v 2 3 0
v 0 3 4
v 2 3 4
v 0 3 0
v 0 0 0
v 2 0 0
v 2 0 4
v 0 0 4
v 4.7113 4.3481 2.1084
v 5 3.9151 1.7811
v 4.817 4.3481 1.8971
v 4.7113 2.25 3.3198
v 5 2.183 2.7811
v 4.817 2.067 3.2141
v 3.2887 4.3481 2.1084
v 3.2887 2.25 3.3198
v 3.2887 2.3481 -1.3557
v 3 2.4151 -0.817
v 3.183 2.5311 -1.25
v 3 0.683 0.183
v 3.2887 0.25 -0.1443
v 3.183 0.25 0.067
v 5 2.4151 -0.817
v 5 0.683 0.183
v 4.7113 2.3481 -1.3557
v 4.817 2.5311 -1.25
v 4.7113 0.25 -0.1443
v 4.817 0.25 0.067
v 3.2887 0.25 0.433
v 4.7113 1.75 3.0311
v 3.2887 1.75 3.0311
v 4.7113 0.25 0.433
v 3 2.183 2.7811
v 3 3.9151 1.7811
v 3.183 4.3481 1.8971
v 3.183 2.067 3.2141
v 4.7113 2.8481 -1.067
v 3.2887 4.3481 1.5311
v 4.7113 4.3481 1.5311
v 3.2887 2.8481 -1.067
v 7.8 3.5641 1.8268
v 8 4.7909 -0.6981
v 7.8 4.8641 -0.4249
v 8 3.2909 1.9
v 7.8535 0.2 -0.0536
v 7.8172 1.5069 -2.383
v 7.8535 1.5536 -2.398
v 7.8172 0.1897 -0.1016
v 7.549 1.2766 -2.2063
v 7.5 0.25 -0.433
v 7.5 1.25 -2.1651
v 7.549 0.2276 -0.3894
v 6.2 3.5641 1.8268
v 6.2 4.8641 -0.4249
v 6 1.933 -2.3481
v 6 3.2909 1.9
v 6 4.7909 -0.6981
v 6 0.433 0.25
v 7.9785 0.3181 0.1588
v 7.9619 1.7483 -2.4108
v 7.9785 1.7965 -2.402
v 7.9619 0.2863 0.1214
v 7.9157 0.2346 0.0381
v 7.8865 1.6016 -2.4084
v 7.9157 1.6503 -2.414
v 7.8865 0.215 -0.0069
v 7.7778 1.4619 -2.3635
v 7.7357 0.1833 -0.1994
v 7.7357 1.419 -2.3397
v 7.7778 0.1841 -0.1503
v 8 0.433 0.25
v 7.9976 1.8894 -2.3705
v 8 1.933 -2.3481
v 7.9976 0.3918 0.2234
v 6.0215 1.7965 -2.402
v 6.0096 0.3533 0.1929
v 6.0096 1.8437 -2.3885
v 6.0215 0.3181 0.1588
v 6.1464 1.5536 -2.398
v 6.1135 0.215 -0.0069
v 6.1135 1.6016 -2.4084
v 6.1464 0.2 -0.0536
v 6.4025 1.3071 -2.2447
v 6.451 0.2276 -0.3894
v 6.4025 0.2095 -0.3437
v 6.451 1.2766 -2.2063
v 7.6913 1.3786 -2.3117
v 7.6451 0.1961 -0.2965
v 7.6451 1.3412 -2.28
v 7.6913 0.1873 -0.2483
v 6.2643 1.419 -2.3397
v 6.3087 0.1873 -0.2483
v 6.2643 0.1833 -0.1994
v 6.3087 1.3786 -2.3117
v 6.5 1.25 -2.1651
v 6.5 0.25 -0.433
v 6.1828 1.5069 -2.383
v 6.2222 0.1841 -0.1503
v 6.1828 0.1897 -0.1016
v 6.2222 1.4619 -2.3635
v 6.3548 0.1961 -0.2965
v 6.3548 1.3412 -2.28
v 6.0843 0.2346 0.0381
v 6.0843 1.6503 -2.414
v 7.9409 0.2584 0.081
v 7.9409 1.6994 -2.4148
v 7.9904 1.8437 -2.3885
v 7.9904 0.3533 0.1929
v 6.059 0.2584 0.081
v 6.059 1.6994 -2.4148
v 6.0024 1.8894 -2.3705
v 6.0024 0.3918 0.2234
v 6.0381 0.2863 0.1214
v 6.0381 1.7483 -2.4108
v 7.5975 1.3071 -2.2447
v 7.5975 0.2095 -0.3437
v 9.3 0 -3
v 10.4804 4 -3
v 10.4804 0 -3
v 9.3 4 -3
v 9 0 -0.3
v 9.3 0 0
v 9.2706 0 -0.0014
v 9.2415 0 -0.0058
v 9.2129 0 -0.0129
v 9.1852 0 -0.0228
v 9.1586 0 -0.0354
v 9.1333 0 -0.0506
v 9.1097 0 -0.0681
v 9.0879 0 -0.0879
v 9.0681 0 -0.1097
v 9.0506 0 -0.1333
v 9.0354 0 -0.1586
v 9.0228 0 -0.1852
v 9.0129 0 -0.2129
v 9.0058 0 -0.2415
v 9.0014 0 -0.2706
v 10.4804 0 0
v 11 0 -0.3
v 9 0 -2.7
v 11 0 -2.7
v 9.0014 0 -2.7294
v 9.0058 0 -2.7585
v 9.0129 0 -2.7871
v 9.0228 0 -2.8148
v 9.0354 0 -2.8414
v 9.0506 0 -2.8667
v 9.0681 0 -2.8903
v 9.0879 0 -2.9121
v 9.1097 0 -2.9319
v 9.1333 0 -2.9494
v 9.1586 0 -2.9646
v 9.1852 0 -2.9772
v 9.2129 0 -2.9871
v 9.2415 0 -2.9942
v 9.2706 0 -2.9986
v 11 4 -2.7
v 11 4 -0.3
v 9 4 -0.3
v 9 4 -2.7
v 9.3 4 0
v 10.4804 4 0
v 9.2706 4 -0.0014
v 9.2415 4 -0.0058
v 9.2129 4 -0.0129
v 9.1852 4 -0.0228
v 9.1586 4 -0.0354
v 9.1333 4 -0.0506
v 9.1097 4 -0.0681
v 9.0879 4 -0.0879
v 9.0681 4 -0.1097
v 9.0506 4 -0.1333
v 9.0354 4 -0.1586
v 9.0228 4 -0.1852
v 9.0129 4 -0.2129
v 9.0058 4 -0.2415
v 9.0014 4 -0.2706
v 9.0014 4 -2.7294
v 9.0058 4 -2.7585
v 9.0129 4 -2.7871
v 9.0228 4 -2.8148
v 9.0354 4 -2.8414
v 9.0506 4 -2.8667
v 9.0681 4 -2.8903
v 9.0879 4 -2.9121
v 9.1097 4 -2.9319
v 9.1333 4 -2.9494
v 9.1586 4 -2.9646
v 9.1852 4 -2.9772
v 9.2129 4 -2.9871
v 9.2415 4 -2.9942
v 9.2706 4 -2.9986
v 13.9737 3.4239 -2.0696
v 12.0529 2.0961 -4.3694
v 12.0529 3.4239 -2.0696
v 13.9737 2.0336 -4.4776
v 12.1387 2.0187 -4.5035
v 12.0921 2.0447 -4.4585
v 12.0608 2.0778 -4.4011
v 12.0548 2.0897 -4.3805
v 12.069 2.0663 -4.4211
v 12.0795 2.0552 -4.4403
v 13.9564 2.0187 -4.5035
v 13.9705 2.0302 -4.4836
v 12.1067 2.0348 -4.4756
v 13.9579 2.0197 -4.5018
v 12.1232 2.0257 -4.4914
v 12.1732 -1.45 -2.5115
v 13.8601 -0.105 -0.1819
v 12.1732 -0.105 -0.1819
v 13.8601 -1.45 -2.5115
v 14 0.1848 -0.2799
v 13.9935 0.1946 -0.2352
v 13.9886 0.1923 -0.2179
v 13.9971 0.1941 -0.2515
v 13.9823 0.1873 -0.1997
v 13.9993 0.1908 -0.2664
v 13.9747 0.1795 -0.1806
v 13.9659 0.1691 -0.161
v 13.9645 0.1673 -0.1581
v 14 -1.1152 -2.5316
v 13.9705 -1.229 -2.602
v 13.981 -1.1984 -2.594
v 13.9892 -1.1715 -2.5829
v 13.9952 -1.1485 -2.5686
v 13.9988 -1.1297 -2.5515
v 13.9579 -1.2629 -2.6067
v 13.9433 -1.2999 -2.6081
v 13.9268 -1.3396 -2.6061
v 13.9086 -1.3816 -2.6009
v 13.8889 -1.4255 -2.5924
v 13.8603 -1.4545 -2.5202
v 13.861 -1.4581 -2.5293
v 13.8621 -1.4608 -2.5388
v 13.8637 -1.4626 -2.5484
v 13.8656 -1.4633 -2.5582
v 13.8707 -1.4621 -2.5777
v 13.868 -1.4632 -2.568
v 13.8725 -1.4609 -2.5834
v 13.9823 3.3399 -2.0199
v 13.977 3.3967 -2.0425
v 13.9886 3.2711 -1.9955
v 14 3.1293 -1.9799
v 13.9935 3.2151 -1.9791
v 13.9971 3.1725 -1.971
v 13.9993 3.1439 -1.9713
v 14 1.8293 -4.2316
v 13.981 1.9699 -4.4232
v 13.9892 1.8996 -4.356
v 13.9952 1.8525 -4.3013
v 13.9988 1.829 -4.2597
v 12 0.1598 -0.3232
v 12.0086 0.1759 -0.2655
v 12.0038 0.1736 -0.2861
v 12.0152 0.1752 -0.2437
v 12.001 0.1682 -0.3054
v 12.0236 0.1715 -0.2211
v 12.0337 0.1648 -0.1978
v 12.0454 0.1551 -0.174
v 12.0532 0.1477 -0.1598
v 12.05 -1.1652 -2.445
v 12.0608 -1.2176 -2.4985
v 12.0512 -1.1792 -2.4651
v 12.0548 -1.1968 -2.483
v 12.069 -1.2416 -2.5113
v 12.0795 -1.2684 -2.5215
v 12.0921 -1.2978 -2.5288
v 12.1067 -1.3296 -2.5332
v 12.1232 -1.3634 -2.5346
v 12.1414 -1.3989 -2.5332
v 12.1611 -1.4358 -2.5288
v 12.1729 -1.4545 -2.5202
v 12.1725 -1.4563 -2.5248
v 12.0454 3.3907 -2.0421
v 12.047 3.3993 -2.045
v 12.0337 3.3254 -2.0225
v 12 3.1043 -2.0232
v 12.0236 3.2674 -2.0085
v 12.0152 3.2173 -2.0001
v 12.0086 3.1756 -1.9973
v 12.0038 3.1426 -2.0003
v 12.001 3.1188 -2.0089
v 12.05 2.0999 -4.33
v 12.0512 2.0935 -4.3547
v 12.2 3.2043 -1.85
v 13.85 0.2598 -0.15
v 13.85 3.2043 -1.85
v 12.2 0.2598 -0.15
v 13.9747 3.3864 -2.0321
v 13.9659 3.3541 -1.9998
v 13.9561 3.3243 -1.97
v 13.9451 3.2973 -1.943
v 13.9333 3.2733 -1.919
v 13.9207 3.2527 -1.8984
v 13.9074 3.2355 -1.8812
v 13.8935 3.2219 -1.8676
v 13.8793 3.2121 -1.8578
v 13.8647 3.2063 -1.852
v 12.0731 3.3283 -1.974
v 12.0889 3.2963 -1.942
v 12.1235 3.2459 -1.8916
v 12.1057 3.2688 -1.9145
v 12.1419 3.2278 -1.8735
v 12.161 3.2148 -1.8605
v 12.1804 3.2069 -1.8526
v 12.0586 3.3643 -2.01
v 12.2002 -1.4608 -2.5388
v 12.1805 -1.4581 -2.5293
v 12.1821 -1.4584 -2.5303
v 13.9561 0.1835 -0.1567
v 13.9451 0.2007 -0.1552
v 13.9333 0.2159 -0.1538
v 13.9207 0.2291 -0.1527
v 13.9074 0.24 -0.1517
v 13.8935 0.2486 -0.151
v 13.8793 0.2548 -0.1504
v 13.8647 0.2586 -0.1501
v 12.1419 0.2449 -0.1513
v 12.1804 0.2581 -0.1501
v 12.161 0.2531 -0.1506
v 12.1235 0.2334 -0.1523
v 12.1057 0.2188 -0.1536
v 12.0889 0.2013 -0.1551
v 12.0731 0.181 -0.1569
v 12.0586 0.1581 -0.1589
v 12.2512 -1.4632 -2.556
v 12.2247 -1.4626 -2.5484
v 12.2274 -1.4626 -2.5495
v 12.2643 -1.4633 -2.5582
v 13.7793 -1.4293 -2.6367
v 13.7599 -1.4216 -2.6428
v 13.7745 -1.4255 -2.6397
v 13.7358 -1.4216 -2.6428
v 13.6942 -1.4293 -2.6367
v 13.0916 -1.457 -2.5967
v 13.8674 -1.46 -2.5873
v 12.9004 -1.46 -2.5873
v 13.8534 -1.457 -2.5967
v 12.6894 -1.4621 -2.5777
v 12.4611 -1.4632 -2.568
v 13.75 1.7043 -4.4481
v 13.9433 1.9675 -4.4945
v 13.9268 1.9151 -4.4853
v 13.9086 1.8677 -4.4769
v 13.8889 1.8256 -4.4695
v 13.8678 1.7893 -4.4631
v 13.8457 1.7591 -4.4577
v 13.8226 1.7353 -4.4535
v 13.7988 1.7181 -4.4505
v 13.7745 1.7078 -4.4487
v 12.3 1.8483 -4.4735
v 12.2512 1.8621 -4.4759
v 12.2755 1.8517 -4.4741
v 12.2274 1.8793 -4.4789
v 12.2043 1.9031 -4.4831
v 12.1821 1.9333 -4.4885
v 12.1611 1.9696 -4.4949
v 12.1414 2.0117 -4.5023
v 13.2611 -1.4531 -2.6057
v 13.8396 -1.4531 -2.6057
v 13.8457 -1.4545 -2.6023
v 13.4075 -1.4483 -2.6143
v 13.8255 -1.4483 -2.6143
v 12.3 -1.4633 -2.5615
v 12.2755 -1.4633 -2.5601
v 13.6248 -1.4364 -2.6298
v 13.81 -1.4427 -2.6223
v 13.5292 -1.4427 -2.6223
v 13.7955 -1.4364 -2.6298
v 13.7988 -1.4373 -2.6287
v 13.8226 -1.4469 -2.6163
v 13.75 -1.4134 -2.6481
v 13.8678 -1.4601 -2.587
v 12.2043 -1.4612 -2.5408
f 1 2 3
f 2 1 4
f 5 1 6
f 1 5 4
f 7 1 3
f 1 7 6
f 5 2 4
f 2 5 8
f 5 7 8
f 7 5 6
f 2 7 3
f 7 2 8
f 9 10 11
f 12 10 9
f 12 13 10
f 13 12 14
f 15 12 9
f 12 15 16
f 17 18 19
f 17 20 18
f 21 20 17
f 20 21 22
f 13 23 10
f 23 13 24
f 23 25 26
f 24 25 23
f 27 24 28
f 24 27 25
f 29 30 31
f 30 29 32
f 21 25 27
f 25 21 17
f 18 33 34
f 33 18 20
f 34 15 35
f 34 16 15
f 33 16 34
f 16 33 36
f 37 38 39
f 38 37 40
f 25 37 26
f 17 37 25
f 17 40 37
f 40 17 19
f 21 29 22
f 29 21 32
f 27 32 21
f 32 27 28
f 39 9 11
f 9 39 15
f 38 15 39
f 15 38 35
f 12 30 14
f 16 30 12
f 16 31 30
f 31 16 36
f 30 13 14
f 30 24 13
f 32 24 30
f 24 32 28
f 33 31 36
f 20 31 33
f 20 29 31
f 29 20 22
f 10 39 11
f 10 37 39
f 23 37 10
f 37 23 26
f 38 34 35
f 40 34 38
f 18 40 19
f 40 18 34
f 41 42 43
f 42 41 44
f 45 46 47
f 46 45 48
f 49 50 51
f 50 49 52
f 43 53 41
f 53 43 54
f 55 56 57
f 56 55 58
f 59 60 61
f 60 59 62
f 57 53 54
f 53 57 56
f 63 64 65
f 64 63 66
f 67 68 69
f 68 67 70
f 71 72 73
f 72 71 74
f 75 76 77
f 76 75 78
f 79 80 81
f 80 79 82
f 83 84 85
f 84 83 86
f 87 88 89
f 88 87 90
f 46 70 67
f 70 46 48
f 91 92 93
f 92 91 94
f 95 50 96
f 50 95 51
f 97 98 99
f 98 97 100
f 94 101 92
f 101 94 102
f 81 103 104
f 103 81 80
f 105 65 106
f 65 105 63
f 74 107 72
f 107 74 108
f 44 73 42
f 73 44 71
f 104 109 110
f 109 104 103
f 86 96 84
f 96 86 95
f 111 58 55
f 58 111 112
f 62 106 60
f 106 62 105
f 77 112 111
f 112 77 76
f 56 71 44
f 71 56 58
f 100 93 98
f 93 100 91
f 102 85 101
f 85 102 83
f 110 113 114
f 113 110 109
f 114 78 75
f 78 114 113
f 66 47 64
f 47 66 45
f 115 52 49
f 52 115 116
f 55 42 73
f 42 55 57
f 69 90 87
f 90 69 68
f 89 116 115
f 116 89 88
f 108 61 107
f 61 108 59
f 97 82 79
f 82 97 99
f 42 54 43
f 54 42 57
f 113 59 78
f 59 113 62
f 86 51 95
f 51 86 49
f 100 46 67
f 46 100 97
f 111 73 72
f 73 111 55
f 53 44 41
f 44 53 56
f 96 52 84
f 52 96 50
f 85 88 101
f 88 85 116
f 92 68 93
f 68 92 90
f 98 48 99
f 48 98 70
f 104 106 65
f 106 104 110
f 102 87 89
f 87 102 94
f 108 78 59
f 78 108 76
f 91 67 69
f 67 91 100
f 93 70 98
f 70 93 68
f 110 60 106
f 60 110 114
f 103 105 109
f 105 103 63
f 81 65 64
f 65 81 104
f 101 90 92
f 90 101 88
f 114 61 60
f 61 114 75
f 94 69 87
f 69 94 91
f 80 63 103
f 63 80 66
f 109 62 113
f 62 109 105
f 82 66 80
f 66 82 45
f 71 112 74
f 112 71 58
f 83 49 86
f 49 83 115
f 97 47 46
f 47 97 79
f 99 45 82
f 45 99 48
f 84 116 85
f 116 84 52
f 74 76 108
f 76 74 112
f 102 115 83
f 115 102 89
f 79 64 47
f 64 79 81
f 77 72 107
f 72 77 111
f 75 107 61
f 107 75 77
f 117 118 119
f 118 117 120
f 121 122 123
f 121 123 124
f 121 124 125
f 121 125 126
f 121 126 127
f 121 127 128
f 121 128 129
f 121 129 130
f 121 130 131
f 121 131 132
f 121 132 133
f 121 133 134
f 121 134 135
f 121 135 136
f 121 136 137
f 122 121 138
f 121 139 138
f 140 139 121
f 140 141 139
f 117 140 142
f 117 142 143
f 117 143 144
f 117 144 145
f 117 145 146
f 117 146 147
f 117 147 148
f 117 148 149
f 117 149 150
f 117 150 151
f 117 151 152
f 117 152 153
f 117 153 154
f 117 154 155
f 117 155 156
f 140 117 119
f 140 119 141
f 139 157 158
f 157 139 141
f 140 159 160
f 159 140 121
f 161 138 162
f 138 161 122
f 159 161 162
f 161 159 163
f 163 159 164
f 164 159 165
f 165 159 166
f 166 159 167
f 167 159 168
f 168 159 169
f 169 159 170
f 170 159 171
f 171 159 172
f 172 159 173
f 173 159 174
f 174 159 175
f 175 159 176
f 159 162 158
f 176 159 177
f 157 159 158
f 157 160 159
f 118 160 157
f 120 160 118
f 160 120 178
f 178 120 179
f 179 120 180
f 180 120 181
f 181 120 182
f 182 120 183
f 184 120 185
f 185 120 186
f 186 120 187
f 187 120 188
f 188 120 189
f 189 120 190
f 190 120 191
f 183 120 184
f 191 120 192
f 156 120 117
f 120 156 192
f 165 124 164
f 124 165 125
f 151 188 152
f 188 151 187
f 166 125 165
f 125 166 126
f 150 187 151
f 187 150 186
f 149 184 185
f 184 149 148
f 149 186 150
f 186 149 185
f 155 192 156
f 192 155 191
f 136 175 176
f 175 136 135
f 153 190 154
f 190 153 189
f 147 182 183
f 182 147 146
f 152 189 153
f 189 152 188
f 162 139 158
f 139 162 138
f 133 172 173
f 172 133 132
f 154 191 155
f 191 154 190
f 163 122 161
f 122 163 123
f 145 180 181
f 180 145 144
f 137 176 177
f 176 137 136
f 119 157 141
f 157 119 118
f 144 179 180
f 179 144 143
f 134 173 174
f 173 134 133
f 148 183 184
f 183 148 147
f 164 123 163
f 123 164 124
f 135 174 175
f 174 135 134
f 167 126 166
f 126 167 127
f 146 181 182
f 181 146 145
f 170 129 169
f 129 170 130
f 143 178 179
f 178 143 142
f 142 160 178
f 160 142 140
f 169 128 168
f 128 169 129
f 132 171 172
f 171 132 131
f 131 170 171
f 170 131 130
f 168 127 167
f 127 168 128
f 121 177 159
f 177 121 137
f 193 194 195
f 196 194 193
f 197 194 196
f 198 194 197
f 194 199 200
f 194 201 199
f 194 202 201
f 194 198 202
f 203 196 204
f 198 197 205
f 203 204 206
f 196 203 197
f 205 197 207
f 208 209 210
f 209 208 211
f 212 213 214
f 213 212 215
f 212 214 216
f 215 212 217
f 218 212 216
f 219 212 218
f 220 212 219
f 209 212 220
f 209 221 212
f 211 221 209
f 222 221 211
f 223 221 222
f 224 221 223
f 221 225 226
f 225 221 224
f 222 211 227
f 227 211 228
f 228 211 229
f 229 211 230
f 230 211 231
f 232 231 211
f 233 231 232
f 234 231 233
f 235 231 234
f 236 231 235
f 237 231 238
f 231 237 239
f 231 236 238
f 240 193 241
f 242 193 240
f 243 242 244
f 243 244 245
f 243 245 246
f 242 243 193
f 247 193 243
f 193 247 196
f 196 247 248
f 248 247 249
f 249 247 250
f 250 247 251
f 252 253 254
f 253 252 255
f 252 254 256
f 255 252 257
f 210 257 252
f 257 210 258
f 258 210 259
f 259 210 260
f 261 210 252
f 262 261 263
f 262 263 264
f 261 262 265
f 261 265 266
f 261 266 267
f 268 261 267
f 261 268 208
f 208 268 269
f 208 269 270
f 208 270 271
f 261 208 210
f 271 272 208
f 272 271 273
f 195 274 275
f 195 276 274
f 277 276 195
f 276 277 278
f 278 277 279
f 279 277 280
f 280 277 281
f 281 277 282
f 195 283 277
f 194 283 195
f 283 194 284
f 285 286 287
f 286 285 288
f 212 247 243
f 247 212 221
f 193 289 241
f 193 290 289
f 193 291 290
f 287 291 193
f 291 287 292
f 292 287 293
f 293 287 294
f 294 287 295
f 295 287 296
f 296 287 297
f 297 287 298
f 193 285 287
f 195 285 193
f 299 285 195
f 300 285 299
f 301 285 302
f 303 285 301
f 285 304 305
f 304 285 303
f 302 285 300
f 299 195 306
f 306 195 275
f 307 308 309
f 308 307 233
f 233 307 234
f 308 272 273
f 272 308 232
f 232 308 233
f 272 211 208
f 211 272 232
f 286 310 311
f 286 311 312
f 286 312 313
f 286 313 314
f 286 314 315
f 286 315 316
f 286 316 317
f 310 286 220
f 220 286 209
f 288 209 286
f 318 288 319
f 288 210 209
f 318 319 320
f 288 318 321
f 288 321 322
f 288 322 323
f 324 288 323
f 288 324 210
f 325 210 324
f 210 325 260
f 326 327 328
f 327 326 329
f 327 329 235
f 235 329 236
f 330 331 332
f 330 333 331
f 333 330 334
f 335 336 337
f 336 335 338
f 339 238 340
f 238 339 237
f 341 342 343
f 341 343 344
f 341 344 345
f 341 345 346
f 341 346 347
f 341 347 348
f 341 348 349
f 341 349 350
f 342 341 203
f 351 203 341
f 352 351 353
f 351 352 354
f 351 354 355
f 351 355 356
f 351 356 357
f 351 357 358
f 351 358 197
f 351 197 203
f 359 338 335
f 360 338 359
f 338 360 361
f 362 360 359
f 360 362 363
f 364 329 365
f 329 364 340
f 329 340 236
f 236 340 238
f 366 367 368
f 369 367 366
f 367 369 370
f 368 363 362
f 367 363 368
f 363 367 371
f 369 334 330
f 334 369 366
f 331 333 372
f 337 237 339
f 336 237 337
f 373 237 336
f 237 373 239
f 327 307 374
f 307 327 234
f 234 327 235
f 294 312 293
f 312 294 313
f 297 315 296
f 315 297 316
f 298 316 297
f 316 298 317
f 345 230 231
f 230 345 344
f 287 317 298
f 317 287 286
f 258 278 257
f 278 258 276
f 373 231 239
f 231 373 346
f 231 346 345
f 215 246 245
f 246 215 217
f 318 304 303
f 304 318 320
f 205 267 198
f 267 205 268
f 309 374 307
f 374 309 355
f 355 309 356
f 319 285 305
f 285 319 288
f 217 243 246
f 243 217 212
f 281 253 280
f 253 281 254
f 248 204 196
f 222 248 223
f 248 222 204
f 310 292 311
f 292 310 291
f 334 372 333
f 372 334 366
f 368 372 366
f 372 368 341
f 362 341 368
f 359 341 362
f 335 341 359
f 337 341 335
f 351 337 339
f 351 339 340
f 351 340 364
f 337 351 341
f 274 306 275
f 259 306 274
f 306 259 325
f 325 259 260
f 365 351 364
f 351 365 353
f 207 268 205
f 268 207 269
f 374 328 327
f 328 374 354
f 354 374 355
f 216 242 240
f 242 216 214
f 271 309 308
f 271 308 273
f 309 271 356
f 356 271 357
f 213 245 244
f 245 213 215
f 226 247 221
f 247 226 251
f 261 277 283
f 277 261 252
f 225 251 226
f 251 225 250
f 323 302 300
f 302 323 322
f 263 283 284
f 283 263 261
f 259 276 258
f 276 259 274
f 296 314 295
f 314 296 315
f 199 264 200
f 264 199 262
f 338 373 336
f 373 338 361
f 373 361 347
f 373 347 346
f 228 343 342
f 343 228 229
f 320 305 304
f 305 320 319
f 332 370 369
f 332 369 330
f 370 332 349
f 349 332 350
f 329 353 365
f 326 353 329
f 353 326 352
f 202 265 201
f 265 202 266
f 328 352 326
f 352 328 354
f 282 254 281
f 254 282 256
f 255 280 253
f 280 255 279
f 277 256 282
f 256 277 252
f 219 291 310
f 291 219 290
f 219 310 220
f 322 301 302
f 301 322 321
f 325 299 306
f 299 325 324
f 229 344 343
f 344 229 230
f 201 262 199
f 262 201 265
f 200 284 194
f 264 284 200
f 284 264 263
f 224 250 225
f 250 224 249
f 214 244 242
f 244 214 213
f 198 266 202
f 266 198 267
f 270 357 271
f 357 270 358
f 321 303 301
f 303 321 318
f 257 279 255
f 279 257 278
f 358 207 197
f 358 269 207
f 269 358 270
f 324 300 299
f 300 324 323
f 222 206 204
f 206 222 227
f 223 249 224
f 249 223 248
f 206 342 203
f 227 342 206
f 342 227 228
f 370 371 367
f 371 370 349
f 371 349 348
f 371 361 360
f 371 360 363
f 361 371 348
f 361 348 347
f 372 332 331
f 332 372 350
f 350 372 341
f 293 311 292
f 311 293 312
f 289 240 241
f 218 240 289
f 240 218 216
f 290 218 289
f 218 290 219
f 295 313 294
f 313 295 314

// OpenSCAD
// file: ../../utility/angle/distance_of_angle_range.scad
/// 角度範囲の距離 [deg] を取得
/// @param normalize true: +/-何れの回転方向でも1回転分以内に正規化, false: 多回転する場合もそのまま
function distance_of_angle_range( range = [ 0 : 360 ], normalize = true ) = 
  let
  ( d = range[ 2 ] - range[ 0 ]
  )
    normalize
      ? ( d % 360 )
      : d
  ;
// file: ../../utility/vector/slice_vector.scad
/// vector の部分 vector を取得
/// @param begin 取得したい部分 vector の先頭位置
/// @param end   取得したい部分 vector の終端位置
/// @param internal_buffer 内部バッファー ( 明示的に引数として与える必要はありません )
function slice_vector( v, begin = 0, end = 0, internal_buffer = [ ] ) = 
  let( end = end > begin ? end : begin )
    begin == end
      ? internal_buffer
      : concat( [ v[ begin ] ], slice_vector( v, begin + 1, end, internal_buffer ) )
  ;
// file: ../../utility/angle/angle_step.scad
include <distance_of_angle_range.scad>

/// OpenSCAD の circle と同様のアルゴリズムにより $fn, $fa, $fs から角度範囲のステップ角度[deg]を取得
function angle_step( radius, range = [ 0 : 360 ] ) = 
  let( drange = distance_of_angle_range( range ) )
    drange
      / ( $fn > 0
            ? ( $fn >= 3 ? $fn : 3)
            : ceil
              ( max
                ( min
                  ( drange / $fa
                  , radius * 2 * PI * drange / 360 / $fs
                  )
                , 5
                )
              )
        )
  ;

/// $fn のみから角度範囲のステップ角度を取得
function angle_step_fn( range = [ 0 : 360 ] ) = distance_of_range( range ) / $fn;

/// $fs のみから角度範囲のステップ角度を取得
function angle_step_fs( radius = 1, range = [ 0 : 360 ] ) = distance_of_range( range ) / asin( $fs / radius );
// file: ../../utility/vector/pop_vector_block.scad
include <slice_vector.scad>

/// vector の末尾要素から length 個の要素を並び順のまま取得
function pop_vector_block( v, length = 0 ) = 
  let( end = len( v ) )
    slice_vector( v, end - length, end )
  ;
// file: ../../coordinate/to_cartesian_from_polar.scad
/// カルテシアン座標をポーラー座標から取得
/// @param radius 半径
/// @param angle 角度
/// @note angle=0のときX軸方向に一致、Y軸回転、右ねじ
function to_cartesian_from_polar( radius, angle ) = [ cos( angle ) * radius, -sin( angle ) * radius ];
// file: ../../utility/angle/make_angle_range.scad
include <angle_step.scad>

/// 角度範囲を生成
/// @note 弧のポリゴン分割は OpenSCAD 内蔵の circle と同様に $fn, $fa, $fs から誘導されます。
function make_angle_range( radius, first, last ) = [ first : angle_step( radius, [ first : last ] ) : last ];
/// @note 弧のポリゴン分割は $fn のみから誘導されます。分割数を一定にしたい場合に使用します。
function make_angle_range_fn( first, last ) = [ first : angle_step_fn( [ first : last ] ) : last ];
/// @note 弧のポリゴン分割は $fa のみから誘導されます。分割角度を一定にしたい場合に使用します。
function make_angle_range_fa( first, last ) = [ first : $fa : last ];
/// @note 弧のポリゴン分割は $fs のみから誘導されます。表面の細分割品質を一定にしたい場合に使用します。
function make_angle_range_fs( rasius, first, last ) = [ first : angle_step_fs( radius, [ first : last ] ) : last ];
// file: ../../utility/vector/translate_vector.scad
include <pop_vector_block.scad>

function translate_vector( translation, v, internal_buffer = [ ] ) = 
  len( v ) == 0
    ? internal_buffer
    : translate_vector( translation, pop_vector_block( v, len( v ) - 1 ), concat( internal_buffer, [ v[ 0 ] + translation ] )  )
  ;
// file: ../../geometry/generate_arc_vertices.scad
include <../utility/angle/make_angle_range.scad>
include <../coordinate/to_cartesian_from_polar.scad>

/// 弧の頂点群を生成
/// @param radius 弧の半径
/// @param angle_first 
/// @note 弧のポリゴン分割は OpenSCAD 内蔵の circle と同様に $fn, $fa, $fs から誘導されます。
function generate_arc_vertices( radius, angle_first, angle_last ) =
  generate_arc_vertices_range
  ( radius
  , make_angle_range( radius, angle_first, angle_last )
  );

/// 弧の頂点群を生成
/// @param radius 弧の半径
/// @param angle_first 
/// @note 弧のポリゴン分割は $fn のみから誘導されます。分割数を一定にしたい場合に使用します。
function generate_arc_vertices_fn( radius, angle_first, angle_last ) =
  generate_arc_vertices_range
  ( radius
  , make_angle_range_fn( angle_first, angle_last )
  );

/// 弧の頂点群を生成
/// @param radius 弧の半径
/// @param angle_first 
/// @note 弧のポリゴン分割は $fa のみから誘導されます。分割角度を一定にしたい場合に使用します。
function generate_arc_vertices_fa( radius, angle_first, angle_last ) =
  generate_arc_vertices_range
  ( radius
  , make_angle_range_fa( angle_first, angle_last )
  );

/// 弧の頂点群を生成
/// @param radius 弧の半径
/// @param angle_first 
/// @note 弧のポリゴン分割は $fs のみから誘導されます。表面の細分割品質を一定にしたい場合に使用します。
function generate_arc_vertices_fs( radius, angle_first, angle_last ) =
  generate_arc_vertices_range
  ( radius
  , make_angle_range_fs( radius, angle_first, angle_last )
  );

/// 弧の頂点群を生成
/// @param radius 弧の半径
/// @param range 弧の角度範囲(Y軸回転, 0 [deg] = X軸方向, +向き=右ねじ回転方向)
///                [ first : step : last ]
///                step に $fn, $fa, $fs から誘導される値を使用したい場合は generage_arc_vertices 関数を使用して下さい。
// --- 再帰構築用内部使用パラメーター(ユーザーは明示的に扱う必要の無いパラメーターです) ---
/// @param internal_angle 再帰構築用内部角度値
/// @param internal_buffer 再帰構築用内部バッファー
function generate_arc_vertices_range( radius, angle_range, internal_angle = [ ], internal_buffer = [ ] ) =
  let( internal_angle = internal_angle == [ ] ? angle_range[ 0 ] : internal_angle )
    internal_angle > angle_range[ 2 ]
      ? concat( internal_buffer, [ to_cartesian_from_polar( radius, angle_range[ 2 ] ) ] )
      : generate_arc_vertices_range
        ( radius
        , angle_range
        , internal_angle + angle_range[ 1 ]
        , concat( internal_buffer, [ to_cartesian_from_polar( radius, internal_angle ) ] )
        )
  ;
// file: ../../utility/number/clamp.scad
/// value を [ lowest .. highest ] へ丸める
function clamp( value, lowest = 0, highest = 1 ) =
  max( min( value, highest ), lowest );
// file: ../../utility/angle/normalize_angle.scad
/// 角度を [ lowest .. highest ] [deg] へ正規化
/// @param is_closed_highet true の場合は [ lowest .. highest ) へ正規化し、 false の場合は [ lowest .. highest ] へ正規化する
function normalize_angle( angle, lowest = -360, highest = +360, is_closed_highest = false ) = 
  highest - lowest < 360
    ? echo( str( "normalize_angle: highest(", highest, ") - lowest(", lowest,") = ", highest - lowest, "は 360 [deg] 以上となる組み合わせで使用して下さい。" ) )
    : angle < lowest
        ? normalize_angle( angle + 360 )
        : angle > highest
          ? normalize_angle( angle - 360 )
          : ( is_closed_highest && angle == highest )
              ? angle - 360
              : angle
  ;
// file: ../../geometry/chamfered_square.scad
include <generate_arc_vertices.scad>
include <../utility/vector/translate_vector.scad>

/// 2Dの面取りされた長方形を size から造形
/// @param size OpenSCAD 内蔵 size に準じる
/// @param chamfering_angle 面取り角度 ( chamfering_type が "C" の場合に有効 )
/// @param chamfering_length 面取り長さ ( chamfering_type が "C" の場合はY軸方向の食い込み長さ、 "R" の場合は半径 )
/// @param chamfering_type 面取りタイプ "C":平面, "R":円
/// @note chamfering_{angle|length|type}_{inner|outer} パラメーターは
///         inner: X が内寄り側の上下
///         outer: X が外寄り側の上下
///       で個別に面取りパラメーターを設定したい場合に使用します。
///       chamfering_{angle|length|type}_{inner|outer}_{top|bottom} パラメーターは
///       4つの角それぞれで異なる面取りパラメーターを設定したい場合に使用します。
module chamfered_square
( size
// --- optional detail level-2 ( highest )
, chamfering_angle  = 0
, chamfering_length = 0
, chamfering_type   = "C"
// --- optional for detail level-1
, inner_chamfering_angle = [ ]
, outer_chamfering_angle = [ ]

, inner_chamfering_length  = [ ]
, outer_chamfering_length  = [ ]

, inner_chamfering_type  = [ ]
, outer_chamfering_type  = [ ]

// --- optional for detail level-0 ( lowest )
, inner_bottom_chamfering_angle = [ ]
, inner_top_chamfering_angle    = [ ]
, outer_bottom_chamfering_angle = [ ]
, outer_top_chamfering_angle    = [ ]

, inner_bottom_chamfering_length  = [ ]
, inner_top_chamfering_length     = [ ]
, outer_bottom_chamfering_length  = [ ]
, outer_top_chamfering_length     = [ ]

, inner_bottom_chamfering_type  = [ ]
, inner_top_chamfering_type     = [ ]
, outer_bottom_chamfering_type  = [ ]
, outer_top_chamfering_type     = [ ]
)
{
  let
  ( size = len( size ) == 2 ? size : [ size, size ]
  // to LOD-1 via LOD-2
  , inner_chamfering_angle  = inner_chamfering_angle  != [ ] ? inner_chamfering_angle  : chamfering_angle
  , outer_chamfering_angle  = outer_chamfering_angle  != [ ] ? outer_chamfering_angle  : chamfering_angle
  , inner_chamfering_length = inner_chamfering_length != [ ] ? inner_chamfering_length : chamfering_length
  , outer_chamfering_length = outer_chamfering_length != [ ] ? outer_chamfering_length : chamfering_length
  , inner_chamfering_type   = inner_chamfering_type   != [ ] ? inner_chamfering_type   : chamfering_type
  , outer_chamfering_type   = outer_chamfering_type   != [ ] ? outer_chamfering_type   : chamfering_type
  // to LOD-0 via LOD-1
  , inner_bottom_chamfering_angle   = inner_bottom_chamfering_angle   != [ ] ? inner_bottom_chamfering_angle  : inner_chamfering_angle
  , inner_top_chamfering_angle      = inner_top_chamfering_angle      != [ ] ? inner_top_chamfering_angle     : inner_chamfering_angle
  , outer_bottom_chamfering_angle   = outer_bottom_chamfering_angle   != [ ] ? outer_bottom_chamfering_angle  : outer_chamfering_angle
  , outer_top_chamfering_angle      = outer_top_chamfering_angle      != [ ] ? outer_top_chamfering_angle     : outer_chamfering_angle
  , inner_bottom_chamfering_length  = inner_bottom_chamfering_length  != [ ] ? inner_bottom_chamfering_length : inner_chamfering_length
  , inner_top_chamfering_length     = inner_top_chamfering_length     != [ ] ? inner_top_chamfering_length    : inner_chamfering_length
  , outer_bottom_chamfering_length  = outer_bottom_chamfering_length  != [ ] ? outer_bottom_chamfering_length : outer_chamfering_length
  , outer_top_chamfering_length     = outer_top_chamfering_length     != [ ] ? outer_top_chamfering_length    : outer_chamfering_length
  , inner_bottom_chamfering_type    = inner_bottom_chamfering_type    != [ ] ? inner_bottom_chamfering_type   : inner_chamfering_type
  , inner_top_chamfering_type       = inner_top_chamfering_type       != [ ] ? inner_top_chamfering_type      : inner_chamfering_type
  , outer_bottom_chamfering_type    = outer_bottom_chamfering_type    != [ ] ? outer_bottom_chamfering_type   : outer_chamfering_type
  , outer_top_chamfering_type       = outer_top_chamfering_type       != [ ] ? outer_top_chamfering_type      : outer_chamfering_type
  )
  {
    inner_bottom_chamfering_length_x = inner_bottom_chamfering_length * tan( inner_bottom_chamfering_angle );
    inner_top_chamfering_length_x    = inner_top_chamfering_length    * tan( inner_top_chamfering_angle    );
    outer_bottom_chamfering_length_x = outer_bottom_chamfering_length * tan( outer_bottom_chamfering_angle );
    outer_top_chamfering_length_x    = outer_top_chamfering_length    * tan( outer_top_chamfering_angle    );

    vertices_outer_bottom = 
      outer_bottom_chamfering_type == "R"
        ? translate_vector
          ( [ size[ 0 ] - outer_bottom_chamfering_length, outer_bottom_chamfering_length ]
          , generate_arc_vertices( outer_bottom_chamfering_length,   0,  90 )
          )
        : outer_bottom_chamfering_type == "C"
            ? [ [ size[ 0 ]                                   , outer_bottom_chamfering_length ]
              , [ size[ 0 ] - outer_bottom_chamfering_length_x, 0                              ]
              ]
            : [ [ size[ 0 ], 0 ]
              ]
      ;
    

    vertices_inner_bottom =
      inner_bottom_chamfering_type == "R"
        ? translate_vector
          ( [ inner_bottom_chamfering_length, inner_bottom_chamfering_length ]
          , generate_arc_vertices( inner_bottom_chamfering_length,  90, 180 )
          )
        : inner_bottom_chamfering_type == "C"
            ? [ [ inner_bottom_chamfering_length_x, 0                              ]
              , [ 0                               , inner_bottom_chamfering_length ]
              ]
            : [ [ 0, 0 ]
              ]
      ;
    
    vertices_inner_top = 
      inner_top_chamfering_type == "R"
        ? translate_vector
          ( [ inner_top_chamfering_length, size[ 1 ] - inner_top_chamfering_length ]
          , generate_arc_vertices( outer_top_chamfering_length, 180, 270 )
          )
        : inner_top_chamfering_type == "C"
            ? [ [ 0                            , size[ 1 ] - inner_top_chamfering_length ]
              , [ inner_top_chamfering_length_x, size[ 1 ]                               ]
              ]
            : [ [ 0, size[ 1 ] ]
              ]
      ;

    vertices_outer_top = 
      outer_top_chamfering_type == "R"
        ? translate_vector
          ( [ size[ 0 ] - outer_top_chamfering_length, size[ 1 ] - outer_top_chamfering_length ]
          , generate_arc_vertices( outer_top_chamfering_length, 270, 360 )
          )
        : outer_top_chamfering_type == "C"
            ? [ [ size[ 0 ] - outer_top_chamfering_length_x, size[ 1 ]                               ]
              , [ size[ 0 ]                                , size[ 1 ] - outer_top_chamfering_length ]
              ]
            : [ [ size[ 0 ], size[ 1 ] ]
              ]
      ;

    vertices = concat( vertices_outer_bottom, vertices_inner_bottom, vertices_inner_top, vertices_outer_top );

    polygon( vertices );
  }
}
// file: ../../utility/color/HSL.scad
include <../angle/normalize_angle.scad>
include <../number/clamp.scad>

/// @param source [ Hue, Satulation, Lightness ]
/// @note Hue        の次元 = 角度 [deg]; [ 0 .. 360 )
///       Satulation の次元 = 無(比) [-]; [ 0 .. 1 ]
///       Lighenesss の次元 = 無(比) [-]; [ 0 .. 1 ]
/// @return [ Red, Green, Blue ]; 各要素の次元は無(比), 値域は [ 0 .. 1 ]
/// @note https://stackoverflow.com/a/9493060/1211392
function to_RGB_from_HSL( source ) = 
  let
  ( H = normalize_angle( source[ 0 ], 0, 360, true ) / 360
  , S = clamp( source[ 1 ], 0, 1 )
  , L = clamp( source[ 2 ], 0, 1 )
  , q = L < 0.5 ? L * ( 1 + S ) : L + S - L * S
  , p = 2 * L - q
  )
    S == 0
      ? [ L, L, L ]
      : [ to_RGB_from_HSL_detail( p, q, H + 1 / 3 )
        , to_RGB_from_HSL_detail( p, q, H         )
        , to_RGB_from_HSL_detail( p, q, H - 1 / 3 )
        ]
  ;

/// ユーザーが直接使用する事を想定していない to_RGB_from_HSL_detail から内部的に使用する実装詳細です
function to_RGB_from_HSL_detail( p, q, t ) = 
  let( t = t < 0 ? t + 1 : t )
    let( t = t > 1 ? t - 1 : t )
      t < 1 / 6
        ? p + ( q - p ) * 6 * t
        : t < 1 / 2
          ? q
          : t < 2 / 3
            ? p + ( q - p ) * ( 2 / 3 - t ) * 6
            : p
  ;
// main file
// ↓この example の本体機能用です
use <../../geometry/chamfered_cube.scad>
// ↓わかりやすく色付けする用です
use <../../utility/color/HSL.scad>

$fs = 0.1;
$fa = 1;
$fn = 16;

size = [ 2, 3, 4 ];

// 面取りなし = cube
color( to_RGB_from_HSL( [ 0, 1, 0.8 ] ) )
rotate( [ $t * 360, 0, 0 ] )
chamfered_cube( size );

// すべての面を 0.5C 30deg で面取り
// chamfering_parameters は「すべての面」＝「デフォルトの面取りパラメーター設定」です。
color( to_RGB_from_HSL( [ 30, 1, 0.8 ] ) )
translate( [ size[ 0 ] + 1, 0, 0 ] )
rotate( [ $t * 360 - 30, 0, 0 ] )
chamfered_cube
( size
, chamfering_parameters = [ 30, 0.5, "C" ]
);

// 上面の右/左/前/後の4面を 0.5C 45deg で面取り、
// 下面の右/左/前/後の4面を 0.5R で面取り
// (前面の右/左、背面の右/左はデフォルト未設定なので面取りなしになります)
color( to_RGB_from_HSL( [ 30 * 2, 1, 0.8 ] ) )
translate( [ ( size[ 0 ] + 1 ) * 2, 0, 0 ] )
rotate( [ $t * 360 - 30 * 2, 0, 0 ] )
chamfered_cube
( size
, top_chamfering_parameters    = [ 45, 0.2, "C" ]
, bottom_chamfering_parameters = [  0, 0.5, "R" ]
);

// 右面の上/下/前/後の4面を 0.3C 60deg で面取り、
// 左面の上/下/前/後の4面を 0.3R で面取り
// (上面の前/背、下面の前/背はデフォルト未設定なので面取りなしになります)
color( to_RGB_from_HSL( [ 30 * 3, 1, 0.8 ] ) )
translate( [ ( size[ 0 ] + 1 ) * 3, 0, 0 ] )
rotate( [ $t * 360 - 30 * 3, 0, 0 ] )
chamfered_cube
( size
, right_chamfering_parameters = [ 60, 0.3, "C" ]
, left_chamfering_parameters  = [  0, 0.3, "R" ]
);

// 右面の上/下/前/後の4面を 0.3C 60deg で面取り、
// 左面の上/下/前/後の4面を 0.3R で面取り
// (上面の前/背、下面の前/背はデフォルト未設定なので面取りなしになります)
color( to_RGB_from_HSL( [ 30 * 4, 1, 0.8 ] ) )
translate( [ ( size[ 0 ] + 1 ) * 4, 0, 0 ] )
rotate( [ $t * 360 - 30 * 4, 0, 0 ] )
chamfered_cube
( size
, top_right_chamfering_parameters     = [  5, 0.3, "C" ]
, top_left_chamfering_parameters      = [ 10, 0.3, "C" ]
, top_front_chamfering_parameters     = [ 15, 0.3, "C" ]
, top_back_chamfering_parameters      = [ 20, 0.3, "C" ]
, bottom_right_chamfering_parameters  = [ 25, 0.3, "C" ]
, bottom_left_chamfering_parameters   = [ 30, 0.3, "C" ]
, bottom_front_chamfering_parameters  = [ 35, 0.3, "C" ]
, bottom_back_chamfering_parameters   = [  0, 0.10, "R" ]
, front_right_chamfering_parameters   = [  0, 0.15, "R" ]
, front_left_chamfering_parameters    = [  0, 0.20, "R" ]
, back_right_chamfering_parameters    = [  0, 0.25, "R" ]
, back_left_chamfering_parameters     = [  0, 0.30, "R" ]
);
